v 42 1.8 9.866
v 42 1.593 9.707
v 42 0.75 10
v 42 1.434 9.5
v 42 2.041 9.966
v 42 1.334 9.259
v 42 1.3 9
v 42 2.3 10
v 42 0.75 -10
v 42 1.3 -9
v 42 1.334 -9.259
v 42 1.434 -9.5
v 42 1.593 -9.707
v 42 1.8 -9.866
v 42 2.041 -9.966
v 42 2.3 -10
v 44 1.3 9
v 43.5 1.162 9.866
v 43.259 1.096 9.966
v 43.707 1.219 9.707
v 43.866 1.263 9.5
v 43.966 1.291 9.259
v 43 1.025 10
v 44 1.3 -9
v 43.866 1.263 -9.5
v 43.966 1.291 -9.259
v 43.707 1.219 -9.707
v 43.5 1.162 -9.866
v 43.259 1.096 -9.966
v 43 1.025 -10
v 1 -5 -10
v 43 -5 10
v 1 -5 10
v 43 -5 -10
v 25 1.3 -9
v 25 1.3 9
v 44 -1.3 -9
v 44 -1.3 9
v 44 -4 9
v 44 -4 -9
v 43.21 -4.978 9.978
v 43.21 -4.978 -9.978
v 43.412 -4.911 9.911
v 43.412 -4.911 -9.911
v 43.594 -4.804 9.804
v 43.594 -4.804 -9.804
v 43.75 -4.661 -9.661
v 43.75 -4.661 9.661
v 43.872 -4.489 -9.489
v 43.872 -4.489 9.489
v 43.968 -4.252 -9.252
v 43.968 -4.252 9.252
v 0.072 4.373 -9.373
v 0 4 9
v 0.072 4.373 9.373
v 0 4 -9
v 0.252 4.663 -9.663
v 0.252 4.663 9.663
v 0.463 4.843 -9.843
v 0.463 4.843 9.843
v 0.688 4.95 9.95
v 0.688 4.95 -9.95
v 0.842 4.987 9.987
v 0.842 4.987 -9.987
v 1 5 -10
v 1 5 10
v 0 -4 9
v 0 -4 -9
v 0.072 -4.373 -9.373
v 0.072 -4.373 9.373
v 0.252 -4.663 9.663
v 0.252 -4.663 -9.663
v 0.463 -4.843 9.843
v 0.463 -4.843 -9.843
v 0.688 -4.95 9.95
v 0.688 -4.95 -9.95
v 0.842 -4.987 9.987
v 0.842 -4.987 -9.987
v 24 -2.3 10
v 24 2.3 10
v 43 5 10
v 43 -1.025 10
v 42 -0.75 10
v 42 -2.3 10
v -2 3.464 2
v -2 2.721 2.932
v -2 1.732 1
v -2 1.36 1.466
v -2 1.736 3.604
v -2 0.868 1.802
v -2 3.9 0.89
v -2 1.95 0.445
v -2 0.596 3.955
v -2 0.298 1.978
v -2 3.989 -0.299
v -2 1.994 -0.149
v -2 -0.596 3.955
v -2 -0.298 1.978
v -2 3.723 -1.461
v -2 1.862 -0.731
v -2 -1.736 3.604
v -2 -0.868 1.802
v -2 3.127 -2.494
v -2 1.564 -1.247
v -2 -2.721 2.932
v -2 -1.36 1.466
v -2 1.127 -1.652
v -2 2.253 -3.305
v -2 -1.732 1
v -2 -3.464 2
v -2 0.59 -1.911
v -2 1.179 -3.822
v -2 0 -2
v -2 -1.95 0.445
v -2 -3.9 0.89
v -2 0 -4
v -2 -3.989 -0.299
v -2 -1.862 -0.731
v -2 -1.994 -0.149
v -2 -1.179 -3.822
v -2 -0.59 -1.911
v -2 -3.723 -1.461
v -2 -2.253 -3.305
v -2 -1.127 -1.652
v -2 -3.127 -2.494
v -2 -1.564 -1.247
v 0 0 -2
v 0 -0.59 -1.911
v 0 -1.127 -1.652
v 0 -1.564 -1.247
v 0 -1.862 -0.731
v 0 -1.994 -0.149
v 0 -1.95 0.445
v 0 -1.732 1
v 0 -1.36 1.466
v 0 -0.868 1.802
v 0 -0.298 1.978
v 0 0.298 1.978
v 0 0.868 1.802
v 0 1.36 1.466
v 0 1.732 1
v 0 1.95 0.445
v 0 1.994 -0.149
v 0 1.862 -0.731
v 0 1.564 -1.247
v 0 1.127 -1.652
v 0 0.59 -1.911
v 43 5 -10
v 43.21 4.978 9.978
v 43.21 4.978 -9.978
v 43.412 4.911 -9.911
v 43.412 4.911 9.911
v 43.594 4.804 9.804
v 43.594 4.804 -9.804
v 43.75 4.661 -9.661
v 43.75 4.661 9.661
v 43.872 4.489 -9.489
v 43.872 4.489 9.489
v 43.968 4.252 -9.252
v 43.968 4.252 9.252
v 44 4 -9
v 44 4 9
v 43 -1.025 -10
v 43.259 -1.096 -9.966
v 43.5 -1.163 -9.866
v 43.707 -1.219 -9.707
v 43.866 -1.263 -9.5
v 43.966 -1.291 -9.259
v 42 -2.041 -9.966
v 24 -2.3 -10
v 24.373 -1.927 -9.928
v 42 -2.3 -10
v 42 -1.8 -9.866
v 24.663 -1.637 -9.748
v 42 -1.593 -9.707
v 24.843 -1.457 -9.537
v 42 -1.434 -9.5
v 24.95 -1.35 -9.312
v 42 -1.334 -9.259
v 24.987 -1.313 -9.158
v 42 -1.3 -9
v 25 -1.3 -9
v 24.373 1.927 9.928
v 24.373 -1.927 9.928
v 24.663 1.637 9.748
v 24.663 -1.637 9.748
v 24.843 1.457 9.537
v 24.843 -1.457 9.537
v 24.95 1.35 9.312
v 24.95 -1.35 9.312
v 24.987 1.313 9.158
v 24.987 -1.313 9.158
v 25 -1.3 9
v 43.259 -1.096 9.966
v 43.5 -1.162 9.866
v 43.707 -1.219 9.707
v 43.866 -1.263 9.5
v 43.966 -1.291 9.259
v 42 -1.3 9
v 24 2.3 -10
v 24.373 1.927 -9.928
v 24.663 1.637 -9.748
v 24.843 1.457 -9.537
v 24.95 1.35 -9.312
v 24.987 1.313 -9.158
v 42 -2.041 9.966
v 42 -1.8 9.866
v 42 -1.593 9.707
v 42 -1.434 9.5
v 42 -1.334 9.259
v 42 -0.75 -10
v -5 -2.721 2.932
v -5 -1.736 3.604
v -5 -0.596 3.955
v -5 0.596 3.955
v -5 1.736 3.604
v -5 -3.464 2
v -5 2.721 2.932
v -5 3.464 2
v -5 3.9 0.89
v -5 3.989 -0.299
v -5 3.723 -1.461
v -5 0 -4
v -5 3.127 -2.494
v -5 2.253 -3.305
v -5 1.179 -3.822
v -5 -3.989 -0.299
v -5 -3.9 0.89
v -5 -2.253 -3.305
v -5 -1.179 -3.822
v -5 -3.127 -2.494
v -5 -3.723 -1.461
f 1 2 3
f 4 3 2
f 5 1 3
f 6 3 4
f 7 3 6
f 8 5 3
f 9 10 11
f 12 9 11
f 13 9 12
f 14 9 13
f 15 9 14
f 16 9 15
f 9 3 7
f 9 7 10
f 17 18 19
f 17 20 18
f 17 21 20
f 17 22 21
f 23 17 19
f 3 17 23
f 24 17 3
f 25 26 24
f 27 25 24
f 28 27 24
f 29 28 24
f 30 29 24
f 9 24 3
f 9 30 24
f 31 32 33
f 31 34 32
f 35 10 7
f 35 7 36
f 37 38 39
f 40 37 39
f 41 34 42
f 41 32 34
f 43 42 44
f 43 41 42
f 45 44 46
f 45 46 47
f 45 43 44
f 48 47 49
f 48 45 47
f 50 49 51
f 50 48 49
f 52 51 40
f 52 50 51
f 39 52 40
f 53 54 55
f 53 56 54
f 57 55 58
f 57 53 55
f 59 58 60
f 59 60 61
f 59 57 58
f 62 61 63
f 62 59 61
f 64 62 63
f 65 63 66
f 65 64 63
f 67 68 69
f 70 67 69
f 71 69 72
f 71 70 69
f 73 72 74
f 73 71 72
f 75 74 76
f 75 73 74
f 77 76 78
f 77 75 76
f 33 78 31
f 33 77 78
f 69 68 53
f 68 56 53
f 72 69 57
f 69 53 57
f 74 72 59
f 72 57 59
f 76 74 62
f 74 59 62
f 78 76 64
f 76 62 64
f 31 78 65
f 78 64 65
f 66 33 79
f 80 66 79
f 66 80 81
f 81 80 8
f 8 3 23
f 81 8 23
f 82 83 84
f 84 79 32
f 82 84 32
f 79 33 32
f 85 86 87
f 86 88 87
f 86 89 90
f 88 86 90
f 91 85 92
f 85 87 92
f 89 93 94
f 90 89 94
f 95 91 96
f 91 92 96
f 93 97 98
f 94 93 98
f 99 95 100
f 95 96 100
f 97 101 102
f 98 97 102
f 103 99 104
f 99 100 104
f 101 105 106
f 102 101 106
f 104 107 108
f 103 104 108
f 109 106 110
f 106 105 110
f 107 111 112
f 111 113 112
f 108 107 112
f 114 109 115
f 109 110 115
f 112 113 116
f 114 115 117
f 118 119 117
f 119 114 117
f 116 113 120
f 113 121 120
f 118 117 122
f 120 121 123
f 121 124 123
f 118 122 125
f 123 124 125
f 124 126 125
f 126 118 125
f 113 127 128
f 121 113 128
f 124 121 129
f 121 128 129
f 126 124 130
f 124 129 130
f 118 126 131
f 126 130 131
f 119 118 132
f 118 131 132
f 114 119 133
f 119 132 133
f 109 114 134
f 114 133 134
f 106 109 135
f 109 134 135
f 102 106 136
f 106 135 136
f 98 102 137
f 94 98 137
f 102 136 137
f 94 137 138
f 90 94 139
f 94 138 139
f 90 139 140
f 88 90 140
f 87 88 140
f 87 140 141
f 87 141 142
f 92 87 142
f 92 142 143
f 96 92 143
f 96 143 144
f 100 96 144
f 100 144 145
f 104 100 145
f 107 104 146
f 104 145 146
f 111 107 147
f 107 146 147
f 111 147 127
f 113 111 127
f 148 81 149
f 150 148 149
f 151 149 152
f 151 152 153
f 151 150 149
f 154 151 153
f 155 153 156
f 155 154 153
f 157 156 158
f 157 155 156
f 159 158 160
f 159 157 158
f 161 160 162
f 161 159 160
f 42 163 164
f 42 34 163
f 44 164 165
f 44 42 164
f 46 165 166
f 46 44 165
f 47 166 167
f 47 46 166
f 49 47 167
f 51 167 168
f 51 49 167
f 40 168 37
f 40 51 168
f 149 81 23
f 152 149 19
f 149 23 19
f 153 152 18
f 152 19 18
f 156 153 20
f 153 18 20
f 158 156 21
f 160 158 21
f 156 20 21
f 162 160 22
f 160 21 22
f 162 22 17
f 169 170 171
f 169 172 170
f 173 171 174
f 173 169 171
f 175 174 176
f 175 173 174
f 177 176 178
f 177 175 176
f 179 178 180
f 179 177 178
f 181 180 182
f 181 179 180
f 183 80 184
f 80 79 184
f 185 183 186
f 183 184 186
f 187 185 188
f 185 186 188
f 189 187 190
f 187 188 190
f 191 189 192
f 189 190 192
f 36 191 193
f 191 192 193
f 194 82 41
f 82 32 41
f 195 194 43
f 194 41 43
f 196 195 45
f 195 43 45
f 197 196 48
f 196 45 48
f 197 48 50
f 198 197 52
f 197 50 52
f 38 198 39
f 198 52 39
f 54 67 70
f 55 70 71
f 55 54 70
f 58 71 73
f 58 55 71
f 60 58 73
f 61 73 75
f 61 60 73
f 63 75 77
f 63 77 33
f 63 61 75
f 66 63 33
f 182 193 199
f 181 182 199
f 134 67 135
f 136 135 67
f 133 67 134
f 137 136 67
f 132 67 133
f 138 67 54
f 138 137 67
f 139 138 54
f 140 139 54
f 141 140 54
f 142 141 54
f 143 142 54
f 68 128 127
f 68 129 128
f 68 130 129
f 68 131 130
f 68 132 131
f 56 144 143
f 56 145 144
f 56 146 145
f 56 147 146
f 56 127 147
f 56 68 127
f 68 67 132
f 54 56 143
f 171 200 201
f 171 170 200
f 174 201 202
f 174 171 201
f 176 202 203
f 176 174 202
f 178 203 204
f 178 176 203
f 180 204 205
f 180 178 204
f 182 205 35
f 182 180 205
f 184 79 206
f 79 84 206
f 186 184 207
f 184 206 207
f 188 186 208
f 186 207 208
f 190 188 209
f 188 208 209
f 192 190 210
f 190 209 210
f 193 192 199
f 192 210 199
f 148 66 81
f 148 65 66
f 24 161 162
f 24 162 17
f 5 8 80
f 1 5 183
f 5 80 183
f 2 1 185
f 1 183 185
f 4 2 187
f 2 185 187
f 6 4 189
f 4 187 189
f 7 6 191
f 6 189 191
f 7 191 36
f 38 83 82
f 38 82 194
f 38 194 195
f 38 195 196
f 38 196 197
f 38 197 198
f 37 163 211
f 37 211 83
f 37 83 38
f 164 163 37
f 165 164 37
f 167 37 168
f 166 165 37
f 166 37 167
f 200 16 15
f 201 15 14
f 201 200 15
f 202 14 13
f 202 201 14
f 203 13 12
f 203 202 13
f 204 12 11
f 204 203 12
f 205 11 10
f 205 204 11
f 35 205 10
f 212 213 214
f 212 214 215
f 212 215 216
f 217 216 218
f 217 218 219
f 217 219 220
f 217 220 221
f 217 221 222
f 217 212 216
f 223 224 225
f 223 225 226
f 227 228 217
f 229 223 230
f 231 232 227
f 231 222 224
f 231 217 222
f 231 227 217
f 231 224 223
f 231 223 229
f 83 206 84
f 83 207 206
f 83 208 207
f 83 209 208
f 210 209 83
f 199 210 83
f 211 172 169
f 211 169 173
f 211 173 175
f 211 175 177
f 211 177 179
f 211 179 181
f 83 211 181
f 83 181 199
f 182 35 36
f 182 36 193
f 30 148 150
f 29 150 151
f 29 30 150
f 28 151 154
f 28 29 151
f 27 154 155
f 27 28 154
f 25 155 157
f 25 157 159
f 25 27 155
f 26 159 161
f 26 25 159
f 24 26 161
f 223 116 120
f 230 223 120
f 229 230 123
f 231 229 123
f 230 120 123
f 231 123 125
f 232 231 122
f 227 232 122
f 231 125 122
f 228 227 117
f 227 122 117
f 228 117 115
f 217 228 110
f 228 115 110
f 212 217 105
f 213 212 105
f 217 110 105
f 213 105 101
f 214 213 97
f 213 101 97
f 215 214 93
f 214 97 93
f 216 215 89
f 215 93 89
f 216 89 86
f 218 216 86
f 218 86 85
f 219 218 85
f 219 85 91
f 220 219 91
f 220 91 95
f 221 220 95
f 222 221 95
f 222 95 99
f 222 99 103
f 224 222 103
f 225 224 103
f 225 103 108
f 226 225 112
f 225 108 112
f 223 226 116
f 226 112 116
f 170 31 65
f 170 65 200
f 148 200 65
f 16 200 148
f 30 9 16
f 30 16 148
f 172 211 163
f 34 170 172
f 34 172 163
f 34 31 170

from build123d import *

# Parameters (mm, degrees)
F1_DEPTH = 10
F2_R     = 2
F3_DEPTH = 2
F4_R     = 4
F4_R_2   = 2
F5_DEPTH = 3
F6_R     = 1
F7_ANGLE = 90


# Not quite as in the source:
# - a feature names something its author has since deleted; it is built from what else it names


with BuildPart() as f1:
    # F0 (on Front) → F1 (new body, symmetric)
    with BuildSketch(Plane.XZ):
        Polygon((0, 5), (0, 0), (25, 0), (25, 1.3), (25, 5), align=None)
        Polygon((25, 0), (0, 0), (0, -5), (25, -5), (25, -1.3), align=None)
        Polygon((25, 5), (25, 1.3), (42, 1.3), (44, 1.3), (44, 5), align=None)
        Polygon((42, -1.3), (25, -1.3), (25, -5), (44, -5), (44, -1.3), align=None)
        Polygon((44, 1.3), (42, 1.3), (42, 0.75), align=None)
        Polygon((42, -0.75), (42, -1.3), (44, -1.3), align=None)
    extrude(amount=F1_DEPTH, both=True)

    # F2 (on face) → F3 (join)
    with BuildSketch(Plane(origin=(0, 0, 0), x_dir=(0, -1, 0), z_dir=(-1, 0, 0))):
        Circle(F2_R)
    extrude(amount=F3_DEPTH)

    # F4 (on face) → F5 (join)
    with BuildSketch(Plane(origin=(-2, 0, 0), x_dir=(0, -1, 0), z_dir=(-1, 0, 0))):
        Circle(F4_R)
        Circle(F4_R_2, mode=Mode.SUBTRACT)
        Circle(F4_R_2)
    extrude(amount=F5_DEPTH)

    # F6
    f6_edges = [f1.edges().sort_by_distance(p)[0] for p in [
        (44, -10, 3.15),
        (44, 10, 3.15),
        (44, 10, -3.15),
        (44, -10, -3.15),
        (0, -10, 0),
        (0, 10, 0),
        (0, 0, 5),
        (0, 0, -5),
        (44, 0, -5),
        (44, 0, 5),
        (33.5, -10, 1.3),
        (33.5, -10, -1.3),
        (25, -10, 0),
        (25, 10, 0),
        (33.5, 10, 1.3),
        (33.5, 10, -1.3),
    ]]
    fillet(f6_edges, radius=F6_R)


with BuildPart() as f1_1:
    # F7: moved
    add(f1.part.rotate(Axis((12.5, 0, 0), (1, 0, 0)), F7_ANGLE))


solid = f1_1.part
